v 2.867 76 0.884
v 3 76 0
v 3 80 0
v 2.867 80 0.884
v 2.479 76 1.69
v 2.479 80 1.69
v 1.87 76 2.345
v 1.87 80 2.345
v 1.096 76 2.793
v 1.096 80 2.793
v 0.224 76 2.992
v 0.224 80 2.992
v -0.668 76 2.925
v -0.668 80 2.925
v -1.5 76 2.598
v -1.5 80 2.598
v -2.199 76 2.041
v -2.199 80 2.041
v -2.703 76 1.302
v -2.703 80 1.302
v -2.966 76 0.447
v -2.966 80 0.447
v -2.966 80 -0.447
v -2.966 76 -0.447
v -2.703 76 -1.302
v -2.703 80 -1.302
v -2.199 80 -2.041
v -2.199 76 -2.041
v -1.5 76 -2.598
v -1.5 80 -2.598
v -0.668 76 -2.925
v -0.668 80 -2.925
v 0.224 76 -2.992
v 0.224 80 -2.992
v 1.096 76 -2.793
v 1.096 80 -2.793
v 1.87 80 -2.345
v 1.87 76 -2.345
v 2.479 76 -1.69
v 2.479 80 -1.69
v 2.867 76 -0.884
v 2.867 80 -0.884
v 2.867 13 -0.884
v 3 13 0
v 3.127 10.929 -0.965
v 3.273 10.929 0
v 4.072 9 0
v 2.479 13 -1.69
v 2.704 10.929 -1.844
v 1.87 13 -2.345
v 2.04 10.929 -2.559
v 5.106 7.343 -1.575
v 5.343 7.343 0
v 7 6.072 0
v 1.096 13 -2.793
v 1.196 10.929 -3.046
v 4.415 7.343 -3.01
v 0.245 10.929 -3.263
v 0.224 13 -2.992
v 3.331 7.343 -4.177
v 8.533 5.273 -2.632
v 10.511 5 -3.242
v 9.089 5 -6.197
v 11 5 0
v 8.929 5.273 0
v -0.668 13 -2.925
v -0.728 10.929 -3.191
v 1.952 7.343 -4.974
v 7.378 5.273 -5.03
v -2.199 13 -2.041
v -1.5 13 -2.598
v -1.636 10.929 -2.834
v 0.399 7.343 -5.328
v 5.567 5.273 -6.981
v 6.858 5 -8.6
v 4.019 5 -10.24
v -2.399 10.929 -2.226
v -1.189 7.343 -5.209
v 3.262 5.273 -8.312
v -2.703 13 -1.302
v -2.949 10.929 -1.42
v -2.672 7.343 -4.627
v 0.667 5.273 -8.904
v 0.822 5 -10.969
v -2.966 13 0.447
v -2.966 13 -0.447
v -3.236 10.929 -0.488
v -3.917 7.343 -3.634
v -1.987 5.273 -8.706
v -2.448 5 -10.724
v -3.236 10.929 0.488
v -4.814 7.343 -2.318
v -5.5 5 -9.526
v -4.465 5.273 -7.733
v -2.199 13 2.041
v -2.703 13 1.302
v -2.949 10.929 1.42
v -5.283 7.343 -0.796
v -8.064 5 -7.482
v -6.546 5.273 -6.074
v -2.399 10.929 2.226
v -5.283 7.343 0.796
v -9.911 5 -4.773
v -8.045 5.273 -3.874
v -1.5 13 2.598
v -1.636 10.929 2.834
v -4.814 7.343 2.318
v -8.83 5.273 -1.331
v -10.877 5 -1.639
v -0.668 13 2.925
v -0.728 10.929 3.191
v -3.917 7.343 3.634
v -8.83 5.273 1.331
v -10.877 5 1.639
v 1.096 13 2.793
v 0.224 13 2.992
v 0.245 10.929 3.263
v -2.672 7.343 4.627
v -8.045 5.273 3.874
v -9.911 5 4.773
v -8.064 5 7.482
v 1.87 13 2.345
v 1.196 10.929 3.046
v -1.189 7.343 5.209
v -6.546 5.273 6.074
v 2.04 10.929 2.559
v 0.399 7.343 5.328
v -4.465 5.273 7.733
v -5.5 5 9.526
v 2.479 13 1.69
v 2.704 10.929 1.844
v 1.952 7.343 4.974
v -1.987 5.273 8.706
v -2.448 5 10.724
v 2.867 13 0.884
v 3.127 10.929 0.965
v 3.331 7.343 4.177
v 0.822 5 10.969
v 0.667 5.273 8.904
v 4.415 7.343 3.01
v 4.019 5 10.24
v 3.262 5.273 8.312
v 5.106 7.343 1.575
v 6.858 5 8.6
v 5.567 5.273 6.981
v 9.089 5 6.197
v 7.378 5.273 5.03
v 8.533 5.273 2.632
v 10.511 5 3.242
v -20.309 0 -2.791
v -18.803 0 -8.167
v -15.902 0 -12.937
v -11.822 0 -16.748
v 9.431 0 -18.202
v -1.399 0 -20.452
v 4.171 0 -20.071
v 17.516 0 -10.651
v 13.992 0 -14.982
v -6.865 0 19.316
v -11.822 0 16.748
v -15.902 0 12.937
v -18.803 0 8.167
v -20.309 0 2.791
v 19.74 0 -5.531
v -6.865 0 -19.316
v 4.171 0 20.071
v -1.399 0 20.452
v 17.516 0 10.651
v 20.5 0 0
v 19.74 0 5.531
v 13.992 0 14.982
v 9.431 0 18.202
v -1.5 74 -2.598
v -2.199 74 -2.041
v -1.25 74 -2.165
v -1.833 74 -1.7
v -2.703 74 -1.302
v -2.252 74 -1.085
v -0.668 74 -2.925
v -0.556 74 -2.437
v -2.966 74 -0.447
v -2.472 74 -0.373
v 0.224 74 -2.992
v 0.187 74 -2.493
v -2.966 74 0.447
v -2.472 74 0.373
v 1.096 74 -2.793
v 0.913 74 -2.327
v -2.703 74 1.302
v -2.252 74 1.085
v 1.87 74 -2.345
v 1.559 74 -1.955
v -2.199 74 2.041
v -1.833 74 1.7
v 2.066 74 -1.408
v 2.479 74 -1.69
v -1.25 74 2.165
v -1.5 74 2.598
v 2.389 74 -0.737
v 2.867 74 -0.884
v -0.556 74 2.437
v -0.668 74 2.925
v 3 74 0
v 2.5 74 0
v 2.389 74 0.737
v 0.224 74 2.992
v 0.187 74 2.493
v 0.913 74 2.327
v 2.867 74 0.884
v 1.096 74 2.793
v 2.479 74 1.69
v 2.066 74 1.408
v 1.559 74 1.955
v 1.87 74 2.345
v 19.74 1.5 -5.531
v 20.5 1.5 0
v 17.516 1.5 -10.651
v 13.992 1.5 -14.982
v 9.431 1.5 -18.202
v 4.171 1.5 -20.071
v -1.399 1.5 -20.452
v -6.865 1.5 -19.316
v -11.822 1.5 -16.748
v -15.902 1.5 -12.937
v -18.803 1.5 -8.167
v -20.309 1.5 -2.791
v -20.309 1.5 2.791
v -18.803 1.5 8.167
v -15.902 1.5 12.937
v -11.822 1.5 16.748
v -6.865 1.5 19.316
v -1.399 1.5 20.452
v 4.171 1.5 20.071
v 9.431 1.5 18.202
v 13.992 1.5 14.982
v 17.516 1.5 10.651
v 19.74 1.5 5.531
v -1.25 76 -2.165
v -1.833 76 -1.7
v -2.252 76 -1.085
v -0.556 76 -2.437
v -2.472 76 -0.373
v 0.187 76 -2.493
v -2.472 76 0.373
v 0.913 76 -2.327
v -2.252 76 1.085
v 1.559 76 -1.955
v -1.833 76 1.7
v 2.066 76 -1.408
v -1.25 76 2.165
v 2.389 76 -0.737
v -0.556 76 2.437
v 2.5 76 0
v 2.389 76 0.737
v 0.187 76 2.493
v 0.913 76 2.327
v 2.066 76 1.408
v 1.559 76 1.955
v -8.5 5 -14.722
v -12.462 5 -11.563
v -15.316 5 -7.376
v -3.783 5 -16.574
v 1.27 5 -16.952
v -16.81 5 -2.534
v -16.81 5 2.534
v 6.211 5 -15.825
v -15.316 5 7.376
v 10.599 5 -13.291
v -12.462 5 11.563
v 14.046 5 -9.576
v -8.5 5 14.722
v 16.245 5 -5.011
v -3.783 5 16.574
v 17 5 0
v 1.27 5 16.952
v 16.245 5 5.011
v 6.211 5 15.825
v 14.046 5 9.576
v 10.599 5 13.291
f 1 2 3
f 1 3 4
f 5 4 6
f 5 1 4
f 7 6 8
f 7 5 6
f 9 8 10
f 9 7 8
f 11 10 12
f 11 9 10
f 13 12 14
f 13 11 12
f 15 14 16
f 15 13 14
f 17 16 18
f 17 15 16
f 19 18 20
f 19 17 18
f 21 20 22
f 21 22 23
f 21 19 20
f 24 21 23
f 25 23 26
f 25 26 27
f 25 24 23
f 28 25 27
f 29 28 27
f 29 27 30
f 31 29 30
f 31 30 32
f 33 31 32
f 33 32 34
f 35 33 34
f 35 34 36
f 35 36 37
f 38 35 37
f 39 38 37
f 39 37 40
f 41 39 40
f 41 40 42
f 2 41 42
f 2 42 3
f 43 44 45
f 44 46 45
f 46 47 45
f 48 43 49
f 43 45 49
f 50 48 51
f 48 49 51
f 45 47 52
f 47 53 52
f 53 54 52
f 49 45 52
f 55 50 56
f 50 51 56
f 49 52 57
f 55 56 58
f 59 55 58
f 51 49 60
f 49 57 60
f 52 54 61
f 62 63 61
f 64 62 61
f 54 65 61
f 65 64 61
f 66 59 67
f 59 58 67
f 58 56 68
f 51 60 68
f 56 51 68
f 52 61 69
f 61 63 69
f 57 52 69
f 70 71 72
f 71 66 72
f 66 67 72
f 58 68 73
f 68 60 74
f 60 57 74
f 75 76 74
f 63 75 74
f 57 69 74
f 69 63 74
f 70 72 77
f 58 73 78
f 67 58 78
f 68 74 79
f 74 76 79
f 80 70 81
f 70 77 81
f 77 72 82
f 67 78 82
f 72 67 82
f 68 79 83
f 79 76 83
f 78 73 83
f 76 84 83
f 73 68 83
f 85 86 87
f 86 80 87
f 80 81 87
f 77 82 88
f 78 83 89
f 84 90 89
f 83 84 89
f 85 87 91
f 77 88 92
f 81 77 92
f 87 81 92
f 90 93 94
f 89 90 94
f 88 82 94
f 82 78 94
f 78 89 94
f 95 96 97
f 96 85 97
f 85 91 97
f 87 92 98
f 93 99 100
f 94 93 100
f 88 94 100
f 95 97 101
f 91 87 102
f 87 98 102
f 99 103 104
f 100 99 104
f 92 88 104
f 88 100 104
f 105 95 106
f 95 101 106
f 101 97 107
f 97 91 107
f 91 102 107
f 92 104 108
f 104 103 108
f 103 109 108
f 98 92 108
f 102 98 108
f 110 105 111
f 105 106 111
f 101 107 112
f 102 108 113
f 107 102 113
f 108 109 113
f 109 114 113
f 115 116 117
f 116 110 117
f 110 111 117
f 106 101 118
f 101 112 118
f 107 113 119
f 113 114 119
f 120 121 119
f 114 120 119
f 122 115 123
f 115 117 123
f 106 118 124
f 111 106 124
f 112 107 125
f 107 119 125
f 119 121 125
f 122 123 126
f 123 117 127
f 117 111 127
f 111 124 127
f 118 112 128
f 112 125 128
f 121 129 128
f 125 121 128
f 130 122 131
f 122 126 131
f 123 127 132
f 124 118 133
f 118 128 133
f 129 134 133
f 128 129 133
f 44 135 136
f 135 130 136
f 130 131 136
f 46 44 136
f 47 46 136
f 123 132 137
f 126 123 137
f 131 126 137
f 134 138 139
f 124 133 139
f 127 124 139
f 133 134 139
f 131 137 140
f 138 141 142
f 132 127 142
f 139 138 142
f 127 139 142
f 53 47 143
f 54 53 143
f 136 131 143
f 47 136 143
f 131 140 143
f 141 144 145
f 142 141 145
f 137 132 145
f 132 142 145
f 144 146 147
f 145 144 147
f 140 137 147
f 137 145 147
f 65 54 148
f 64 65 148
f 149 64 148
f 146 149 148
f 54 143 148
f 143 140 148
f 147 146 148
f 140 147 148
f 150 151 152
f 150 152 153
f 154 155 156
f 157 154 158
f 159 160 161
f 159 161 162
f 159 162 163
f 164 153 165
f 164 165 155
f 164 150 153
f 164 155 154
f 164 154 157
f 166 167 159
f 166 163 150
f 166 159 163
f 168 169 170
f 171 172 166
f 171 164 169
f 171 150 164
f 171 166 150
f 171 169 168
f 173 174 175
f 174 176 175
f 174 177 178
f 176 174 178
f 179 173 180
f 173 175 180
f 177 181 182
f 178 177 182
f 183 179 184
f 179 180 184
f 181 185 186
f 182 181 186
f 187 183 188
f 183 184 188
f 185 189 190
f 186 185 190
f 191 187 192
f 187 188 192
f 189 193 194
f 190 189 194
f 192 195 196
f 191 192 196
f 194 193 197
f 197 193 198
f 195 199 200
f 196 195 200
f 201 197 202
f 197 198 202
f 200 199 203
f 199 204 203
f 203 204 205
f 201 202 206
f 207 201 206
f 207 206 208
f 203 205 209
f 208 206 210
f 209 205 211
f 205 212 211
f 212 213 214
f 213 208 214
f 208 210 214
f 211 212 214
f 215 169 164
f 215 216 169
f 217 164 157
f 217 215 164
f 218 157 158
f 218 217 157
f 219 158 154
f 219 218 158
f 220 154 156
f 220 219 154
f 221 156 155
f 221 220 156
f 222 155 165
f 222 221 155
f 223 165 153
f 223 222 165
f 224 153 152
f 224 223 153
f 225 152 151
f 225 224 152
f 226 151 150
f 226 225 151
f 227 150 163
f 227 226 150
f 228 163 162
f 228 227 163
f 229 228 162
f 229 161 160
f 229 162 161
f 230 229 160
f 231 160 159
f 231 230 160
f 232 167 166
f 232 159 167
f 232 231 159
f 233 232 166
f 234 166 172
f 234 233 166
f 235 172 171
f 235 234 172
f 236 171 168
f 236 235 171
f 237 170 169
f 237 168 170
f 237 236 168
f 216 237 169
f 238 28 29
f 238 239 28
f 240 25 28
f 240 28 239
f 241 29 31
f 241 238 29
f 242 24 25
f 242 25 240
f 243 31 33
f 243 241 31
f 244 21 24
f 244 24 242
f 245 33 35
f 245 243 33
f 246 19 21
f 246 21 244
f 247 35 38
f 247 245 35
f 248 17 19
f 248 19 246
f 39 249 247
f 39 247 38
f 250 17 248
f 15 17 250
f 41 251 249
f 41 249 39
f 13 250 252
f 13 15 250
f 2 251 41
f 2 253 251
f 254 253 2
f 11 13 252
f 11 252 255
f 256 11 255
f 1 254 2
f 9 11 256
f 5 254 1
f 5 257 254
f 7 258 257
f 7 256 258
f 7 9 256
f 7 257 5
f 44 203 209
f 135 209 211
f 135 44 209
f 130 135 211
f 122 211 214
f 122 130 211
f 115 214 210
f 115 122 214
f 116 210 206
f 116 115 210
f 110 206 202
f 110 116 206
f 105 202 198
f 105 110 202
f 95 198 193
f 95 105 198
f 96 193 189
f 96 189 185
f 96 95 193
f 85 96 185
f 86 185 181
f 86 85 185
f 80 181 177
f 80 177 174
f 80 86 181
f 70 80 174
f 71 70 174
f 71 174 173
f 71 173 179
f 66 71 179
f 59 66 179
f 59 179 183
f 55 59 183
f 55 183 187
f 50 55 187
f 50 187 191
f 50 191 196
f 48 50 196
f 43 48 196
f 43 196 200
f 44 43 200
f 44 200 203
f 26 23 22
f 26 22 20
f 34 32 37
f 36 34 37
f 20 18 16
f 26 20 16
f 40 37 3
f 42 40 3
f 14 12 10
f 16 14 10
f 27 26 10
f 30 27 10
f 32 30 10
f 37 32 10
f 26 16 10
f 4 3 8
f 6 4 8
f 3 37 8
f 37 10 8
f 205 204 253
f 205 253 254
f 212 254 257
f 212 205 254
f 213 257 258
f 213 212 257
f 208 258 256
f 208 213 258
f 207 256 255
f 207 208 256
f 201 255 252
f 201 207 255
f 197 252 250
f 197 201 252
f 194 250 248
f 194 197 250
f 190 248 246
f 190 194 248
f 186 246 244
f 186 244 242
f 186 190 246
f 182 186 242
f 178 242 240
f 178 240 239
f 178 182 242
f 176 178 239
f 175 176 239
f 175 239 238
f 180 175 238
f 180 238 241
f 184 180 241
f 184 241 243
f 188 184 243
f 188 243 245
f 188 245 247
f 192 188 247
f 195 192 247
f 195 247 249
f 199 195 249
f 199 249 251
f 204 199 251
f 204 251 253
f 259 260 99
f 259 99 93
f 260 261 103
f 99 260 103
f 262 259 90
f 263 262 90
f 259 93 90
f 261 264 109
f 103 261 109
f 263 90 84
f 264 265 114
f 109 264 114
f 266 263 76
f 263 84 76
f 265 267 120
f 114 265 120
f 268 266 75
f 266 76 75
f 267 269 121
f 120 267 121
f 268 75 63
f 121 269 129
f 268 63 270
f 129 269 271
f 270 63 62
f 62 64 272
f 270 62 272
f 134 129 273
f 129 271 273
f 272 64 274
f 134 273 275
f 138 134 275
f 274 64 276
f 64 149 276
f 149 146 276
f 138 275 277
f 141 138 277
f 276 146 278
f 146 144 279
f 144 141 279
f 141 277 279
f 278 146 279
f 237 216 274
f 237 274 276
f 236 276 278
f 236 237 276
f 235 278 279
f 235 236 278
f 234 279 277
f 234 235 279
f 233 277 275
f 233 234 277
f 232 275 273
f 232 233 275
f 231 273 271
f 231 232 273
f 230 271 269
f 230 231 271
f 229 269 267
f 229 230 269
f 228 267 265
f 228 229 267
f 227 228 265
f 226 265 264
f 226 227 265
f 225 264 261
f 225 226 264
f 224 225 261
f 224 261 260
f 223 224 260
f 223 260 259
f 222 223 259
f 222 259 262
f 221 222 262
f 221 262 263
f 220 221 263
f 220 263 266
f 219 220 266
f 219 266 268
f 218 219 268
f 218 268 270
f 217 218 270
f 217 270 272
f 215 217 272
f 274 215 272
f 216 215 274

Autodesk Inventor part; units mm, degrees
ref_plane "YZ Plane" through (0, 0, 0) normal (1, 0, 0) x (0, 1, 0)
ref_plane "XZ Plane" through (0, 0, 0) normal (0, 1, 0) x (-1, 0, 0)
ref_plane "XY Plane" through (0, 0, 0) normal (0, 0, 1) x (1, 0, 0)
sketch "Эскиз1" plane through (0, 0, 0) normal (0, 0, 1) x (1, 0, 0)
  line L0 (0, 0) -> (20.5, 0)
  line L1 (20.5, 0) -> (20.5, 1.5)
  line L2 (20.5, 1.5) -> (17, 5)
  line L3 (0, 80) -> (3, 80)
  line L4 (17, 5) -> (11, 5)
  arc A0 (3, 13) -> (11, 5) centre (11, 13) ccw
  line L5 (3, 80) -> (3, 76)
  line L6 (3, 76) -> (2.5, 76)
  line L7 (2.5, 76) -> (2.5, 74)
  line L8 (2.5, 74) -> (3, 74)
  line L9 (3, 80) -> (3, 76)
  line L10 (3, 74) -> (3, 13)
  line L11 (0, 80) -> (0, 0)
  dimension "d0" = 20.5
  dimension "d1" = 1.5
  dimension "d2" = 45
  dimension "d3" = 17
  dimension "d4" = 3
  dimension "d5" = 8
  dimension "d6" = 80
  dimension "d7" = 4
  dimension "d8" = 2
  dimension "d9" = 0.5
revolve "Вращение1" add sketch "Эскиз1" angle 360 about axis through (0, 80, 0) along (0, -1, 0)
properties part number "впускной клапан"
